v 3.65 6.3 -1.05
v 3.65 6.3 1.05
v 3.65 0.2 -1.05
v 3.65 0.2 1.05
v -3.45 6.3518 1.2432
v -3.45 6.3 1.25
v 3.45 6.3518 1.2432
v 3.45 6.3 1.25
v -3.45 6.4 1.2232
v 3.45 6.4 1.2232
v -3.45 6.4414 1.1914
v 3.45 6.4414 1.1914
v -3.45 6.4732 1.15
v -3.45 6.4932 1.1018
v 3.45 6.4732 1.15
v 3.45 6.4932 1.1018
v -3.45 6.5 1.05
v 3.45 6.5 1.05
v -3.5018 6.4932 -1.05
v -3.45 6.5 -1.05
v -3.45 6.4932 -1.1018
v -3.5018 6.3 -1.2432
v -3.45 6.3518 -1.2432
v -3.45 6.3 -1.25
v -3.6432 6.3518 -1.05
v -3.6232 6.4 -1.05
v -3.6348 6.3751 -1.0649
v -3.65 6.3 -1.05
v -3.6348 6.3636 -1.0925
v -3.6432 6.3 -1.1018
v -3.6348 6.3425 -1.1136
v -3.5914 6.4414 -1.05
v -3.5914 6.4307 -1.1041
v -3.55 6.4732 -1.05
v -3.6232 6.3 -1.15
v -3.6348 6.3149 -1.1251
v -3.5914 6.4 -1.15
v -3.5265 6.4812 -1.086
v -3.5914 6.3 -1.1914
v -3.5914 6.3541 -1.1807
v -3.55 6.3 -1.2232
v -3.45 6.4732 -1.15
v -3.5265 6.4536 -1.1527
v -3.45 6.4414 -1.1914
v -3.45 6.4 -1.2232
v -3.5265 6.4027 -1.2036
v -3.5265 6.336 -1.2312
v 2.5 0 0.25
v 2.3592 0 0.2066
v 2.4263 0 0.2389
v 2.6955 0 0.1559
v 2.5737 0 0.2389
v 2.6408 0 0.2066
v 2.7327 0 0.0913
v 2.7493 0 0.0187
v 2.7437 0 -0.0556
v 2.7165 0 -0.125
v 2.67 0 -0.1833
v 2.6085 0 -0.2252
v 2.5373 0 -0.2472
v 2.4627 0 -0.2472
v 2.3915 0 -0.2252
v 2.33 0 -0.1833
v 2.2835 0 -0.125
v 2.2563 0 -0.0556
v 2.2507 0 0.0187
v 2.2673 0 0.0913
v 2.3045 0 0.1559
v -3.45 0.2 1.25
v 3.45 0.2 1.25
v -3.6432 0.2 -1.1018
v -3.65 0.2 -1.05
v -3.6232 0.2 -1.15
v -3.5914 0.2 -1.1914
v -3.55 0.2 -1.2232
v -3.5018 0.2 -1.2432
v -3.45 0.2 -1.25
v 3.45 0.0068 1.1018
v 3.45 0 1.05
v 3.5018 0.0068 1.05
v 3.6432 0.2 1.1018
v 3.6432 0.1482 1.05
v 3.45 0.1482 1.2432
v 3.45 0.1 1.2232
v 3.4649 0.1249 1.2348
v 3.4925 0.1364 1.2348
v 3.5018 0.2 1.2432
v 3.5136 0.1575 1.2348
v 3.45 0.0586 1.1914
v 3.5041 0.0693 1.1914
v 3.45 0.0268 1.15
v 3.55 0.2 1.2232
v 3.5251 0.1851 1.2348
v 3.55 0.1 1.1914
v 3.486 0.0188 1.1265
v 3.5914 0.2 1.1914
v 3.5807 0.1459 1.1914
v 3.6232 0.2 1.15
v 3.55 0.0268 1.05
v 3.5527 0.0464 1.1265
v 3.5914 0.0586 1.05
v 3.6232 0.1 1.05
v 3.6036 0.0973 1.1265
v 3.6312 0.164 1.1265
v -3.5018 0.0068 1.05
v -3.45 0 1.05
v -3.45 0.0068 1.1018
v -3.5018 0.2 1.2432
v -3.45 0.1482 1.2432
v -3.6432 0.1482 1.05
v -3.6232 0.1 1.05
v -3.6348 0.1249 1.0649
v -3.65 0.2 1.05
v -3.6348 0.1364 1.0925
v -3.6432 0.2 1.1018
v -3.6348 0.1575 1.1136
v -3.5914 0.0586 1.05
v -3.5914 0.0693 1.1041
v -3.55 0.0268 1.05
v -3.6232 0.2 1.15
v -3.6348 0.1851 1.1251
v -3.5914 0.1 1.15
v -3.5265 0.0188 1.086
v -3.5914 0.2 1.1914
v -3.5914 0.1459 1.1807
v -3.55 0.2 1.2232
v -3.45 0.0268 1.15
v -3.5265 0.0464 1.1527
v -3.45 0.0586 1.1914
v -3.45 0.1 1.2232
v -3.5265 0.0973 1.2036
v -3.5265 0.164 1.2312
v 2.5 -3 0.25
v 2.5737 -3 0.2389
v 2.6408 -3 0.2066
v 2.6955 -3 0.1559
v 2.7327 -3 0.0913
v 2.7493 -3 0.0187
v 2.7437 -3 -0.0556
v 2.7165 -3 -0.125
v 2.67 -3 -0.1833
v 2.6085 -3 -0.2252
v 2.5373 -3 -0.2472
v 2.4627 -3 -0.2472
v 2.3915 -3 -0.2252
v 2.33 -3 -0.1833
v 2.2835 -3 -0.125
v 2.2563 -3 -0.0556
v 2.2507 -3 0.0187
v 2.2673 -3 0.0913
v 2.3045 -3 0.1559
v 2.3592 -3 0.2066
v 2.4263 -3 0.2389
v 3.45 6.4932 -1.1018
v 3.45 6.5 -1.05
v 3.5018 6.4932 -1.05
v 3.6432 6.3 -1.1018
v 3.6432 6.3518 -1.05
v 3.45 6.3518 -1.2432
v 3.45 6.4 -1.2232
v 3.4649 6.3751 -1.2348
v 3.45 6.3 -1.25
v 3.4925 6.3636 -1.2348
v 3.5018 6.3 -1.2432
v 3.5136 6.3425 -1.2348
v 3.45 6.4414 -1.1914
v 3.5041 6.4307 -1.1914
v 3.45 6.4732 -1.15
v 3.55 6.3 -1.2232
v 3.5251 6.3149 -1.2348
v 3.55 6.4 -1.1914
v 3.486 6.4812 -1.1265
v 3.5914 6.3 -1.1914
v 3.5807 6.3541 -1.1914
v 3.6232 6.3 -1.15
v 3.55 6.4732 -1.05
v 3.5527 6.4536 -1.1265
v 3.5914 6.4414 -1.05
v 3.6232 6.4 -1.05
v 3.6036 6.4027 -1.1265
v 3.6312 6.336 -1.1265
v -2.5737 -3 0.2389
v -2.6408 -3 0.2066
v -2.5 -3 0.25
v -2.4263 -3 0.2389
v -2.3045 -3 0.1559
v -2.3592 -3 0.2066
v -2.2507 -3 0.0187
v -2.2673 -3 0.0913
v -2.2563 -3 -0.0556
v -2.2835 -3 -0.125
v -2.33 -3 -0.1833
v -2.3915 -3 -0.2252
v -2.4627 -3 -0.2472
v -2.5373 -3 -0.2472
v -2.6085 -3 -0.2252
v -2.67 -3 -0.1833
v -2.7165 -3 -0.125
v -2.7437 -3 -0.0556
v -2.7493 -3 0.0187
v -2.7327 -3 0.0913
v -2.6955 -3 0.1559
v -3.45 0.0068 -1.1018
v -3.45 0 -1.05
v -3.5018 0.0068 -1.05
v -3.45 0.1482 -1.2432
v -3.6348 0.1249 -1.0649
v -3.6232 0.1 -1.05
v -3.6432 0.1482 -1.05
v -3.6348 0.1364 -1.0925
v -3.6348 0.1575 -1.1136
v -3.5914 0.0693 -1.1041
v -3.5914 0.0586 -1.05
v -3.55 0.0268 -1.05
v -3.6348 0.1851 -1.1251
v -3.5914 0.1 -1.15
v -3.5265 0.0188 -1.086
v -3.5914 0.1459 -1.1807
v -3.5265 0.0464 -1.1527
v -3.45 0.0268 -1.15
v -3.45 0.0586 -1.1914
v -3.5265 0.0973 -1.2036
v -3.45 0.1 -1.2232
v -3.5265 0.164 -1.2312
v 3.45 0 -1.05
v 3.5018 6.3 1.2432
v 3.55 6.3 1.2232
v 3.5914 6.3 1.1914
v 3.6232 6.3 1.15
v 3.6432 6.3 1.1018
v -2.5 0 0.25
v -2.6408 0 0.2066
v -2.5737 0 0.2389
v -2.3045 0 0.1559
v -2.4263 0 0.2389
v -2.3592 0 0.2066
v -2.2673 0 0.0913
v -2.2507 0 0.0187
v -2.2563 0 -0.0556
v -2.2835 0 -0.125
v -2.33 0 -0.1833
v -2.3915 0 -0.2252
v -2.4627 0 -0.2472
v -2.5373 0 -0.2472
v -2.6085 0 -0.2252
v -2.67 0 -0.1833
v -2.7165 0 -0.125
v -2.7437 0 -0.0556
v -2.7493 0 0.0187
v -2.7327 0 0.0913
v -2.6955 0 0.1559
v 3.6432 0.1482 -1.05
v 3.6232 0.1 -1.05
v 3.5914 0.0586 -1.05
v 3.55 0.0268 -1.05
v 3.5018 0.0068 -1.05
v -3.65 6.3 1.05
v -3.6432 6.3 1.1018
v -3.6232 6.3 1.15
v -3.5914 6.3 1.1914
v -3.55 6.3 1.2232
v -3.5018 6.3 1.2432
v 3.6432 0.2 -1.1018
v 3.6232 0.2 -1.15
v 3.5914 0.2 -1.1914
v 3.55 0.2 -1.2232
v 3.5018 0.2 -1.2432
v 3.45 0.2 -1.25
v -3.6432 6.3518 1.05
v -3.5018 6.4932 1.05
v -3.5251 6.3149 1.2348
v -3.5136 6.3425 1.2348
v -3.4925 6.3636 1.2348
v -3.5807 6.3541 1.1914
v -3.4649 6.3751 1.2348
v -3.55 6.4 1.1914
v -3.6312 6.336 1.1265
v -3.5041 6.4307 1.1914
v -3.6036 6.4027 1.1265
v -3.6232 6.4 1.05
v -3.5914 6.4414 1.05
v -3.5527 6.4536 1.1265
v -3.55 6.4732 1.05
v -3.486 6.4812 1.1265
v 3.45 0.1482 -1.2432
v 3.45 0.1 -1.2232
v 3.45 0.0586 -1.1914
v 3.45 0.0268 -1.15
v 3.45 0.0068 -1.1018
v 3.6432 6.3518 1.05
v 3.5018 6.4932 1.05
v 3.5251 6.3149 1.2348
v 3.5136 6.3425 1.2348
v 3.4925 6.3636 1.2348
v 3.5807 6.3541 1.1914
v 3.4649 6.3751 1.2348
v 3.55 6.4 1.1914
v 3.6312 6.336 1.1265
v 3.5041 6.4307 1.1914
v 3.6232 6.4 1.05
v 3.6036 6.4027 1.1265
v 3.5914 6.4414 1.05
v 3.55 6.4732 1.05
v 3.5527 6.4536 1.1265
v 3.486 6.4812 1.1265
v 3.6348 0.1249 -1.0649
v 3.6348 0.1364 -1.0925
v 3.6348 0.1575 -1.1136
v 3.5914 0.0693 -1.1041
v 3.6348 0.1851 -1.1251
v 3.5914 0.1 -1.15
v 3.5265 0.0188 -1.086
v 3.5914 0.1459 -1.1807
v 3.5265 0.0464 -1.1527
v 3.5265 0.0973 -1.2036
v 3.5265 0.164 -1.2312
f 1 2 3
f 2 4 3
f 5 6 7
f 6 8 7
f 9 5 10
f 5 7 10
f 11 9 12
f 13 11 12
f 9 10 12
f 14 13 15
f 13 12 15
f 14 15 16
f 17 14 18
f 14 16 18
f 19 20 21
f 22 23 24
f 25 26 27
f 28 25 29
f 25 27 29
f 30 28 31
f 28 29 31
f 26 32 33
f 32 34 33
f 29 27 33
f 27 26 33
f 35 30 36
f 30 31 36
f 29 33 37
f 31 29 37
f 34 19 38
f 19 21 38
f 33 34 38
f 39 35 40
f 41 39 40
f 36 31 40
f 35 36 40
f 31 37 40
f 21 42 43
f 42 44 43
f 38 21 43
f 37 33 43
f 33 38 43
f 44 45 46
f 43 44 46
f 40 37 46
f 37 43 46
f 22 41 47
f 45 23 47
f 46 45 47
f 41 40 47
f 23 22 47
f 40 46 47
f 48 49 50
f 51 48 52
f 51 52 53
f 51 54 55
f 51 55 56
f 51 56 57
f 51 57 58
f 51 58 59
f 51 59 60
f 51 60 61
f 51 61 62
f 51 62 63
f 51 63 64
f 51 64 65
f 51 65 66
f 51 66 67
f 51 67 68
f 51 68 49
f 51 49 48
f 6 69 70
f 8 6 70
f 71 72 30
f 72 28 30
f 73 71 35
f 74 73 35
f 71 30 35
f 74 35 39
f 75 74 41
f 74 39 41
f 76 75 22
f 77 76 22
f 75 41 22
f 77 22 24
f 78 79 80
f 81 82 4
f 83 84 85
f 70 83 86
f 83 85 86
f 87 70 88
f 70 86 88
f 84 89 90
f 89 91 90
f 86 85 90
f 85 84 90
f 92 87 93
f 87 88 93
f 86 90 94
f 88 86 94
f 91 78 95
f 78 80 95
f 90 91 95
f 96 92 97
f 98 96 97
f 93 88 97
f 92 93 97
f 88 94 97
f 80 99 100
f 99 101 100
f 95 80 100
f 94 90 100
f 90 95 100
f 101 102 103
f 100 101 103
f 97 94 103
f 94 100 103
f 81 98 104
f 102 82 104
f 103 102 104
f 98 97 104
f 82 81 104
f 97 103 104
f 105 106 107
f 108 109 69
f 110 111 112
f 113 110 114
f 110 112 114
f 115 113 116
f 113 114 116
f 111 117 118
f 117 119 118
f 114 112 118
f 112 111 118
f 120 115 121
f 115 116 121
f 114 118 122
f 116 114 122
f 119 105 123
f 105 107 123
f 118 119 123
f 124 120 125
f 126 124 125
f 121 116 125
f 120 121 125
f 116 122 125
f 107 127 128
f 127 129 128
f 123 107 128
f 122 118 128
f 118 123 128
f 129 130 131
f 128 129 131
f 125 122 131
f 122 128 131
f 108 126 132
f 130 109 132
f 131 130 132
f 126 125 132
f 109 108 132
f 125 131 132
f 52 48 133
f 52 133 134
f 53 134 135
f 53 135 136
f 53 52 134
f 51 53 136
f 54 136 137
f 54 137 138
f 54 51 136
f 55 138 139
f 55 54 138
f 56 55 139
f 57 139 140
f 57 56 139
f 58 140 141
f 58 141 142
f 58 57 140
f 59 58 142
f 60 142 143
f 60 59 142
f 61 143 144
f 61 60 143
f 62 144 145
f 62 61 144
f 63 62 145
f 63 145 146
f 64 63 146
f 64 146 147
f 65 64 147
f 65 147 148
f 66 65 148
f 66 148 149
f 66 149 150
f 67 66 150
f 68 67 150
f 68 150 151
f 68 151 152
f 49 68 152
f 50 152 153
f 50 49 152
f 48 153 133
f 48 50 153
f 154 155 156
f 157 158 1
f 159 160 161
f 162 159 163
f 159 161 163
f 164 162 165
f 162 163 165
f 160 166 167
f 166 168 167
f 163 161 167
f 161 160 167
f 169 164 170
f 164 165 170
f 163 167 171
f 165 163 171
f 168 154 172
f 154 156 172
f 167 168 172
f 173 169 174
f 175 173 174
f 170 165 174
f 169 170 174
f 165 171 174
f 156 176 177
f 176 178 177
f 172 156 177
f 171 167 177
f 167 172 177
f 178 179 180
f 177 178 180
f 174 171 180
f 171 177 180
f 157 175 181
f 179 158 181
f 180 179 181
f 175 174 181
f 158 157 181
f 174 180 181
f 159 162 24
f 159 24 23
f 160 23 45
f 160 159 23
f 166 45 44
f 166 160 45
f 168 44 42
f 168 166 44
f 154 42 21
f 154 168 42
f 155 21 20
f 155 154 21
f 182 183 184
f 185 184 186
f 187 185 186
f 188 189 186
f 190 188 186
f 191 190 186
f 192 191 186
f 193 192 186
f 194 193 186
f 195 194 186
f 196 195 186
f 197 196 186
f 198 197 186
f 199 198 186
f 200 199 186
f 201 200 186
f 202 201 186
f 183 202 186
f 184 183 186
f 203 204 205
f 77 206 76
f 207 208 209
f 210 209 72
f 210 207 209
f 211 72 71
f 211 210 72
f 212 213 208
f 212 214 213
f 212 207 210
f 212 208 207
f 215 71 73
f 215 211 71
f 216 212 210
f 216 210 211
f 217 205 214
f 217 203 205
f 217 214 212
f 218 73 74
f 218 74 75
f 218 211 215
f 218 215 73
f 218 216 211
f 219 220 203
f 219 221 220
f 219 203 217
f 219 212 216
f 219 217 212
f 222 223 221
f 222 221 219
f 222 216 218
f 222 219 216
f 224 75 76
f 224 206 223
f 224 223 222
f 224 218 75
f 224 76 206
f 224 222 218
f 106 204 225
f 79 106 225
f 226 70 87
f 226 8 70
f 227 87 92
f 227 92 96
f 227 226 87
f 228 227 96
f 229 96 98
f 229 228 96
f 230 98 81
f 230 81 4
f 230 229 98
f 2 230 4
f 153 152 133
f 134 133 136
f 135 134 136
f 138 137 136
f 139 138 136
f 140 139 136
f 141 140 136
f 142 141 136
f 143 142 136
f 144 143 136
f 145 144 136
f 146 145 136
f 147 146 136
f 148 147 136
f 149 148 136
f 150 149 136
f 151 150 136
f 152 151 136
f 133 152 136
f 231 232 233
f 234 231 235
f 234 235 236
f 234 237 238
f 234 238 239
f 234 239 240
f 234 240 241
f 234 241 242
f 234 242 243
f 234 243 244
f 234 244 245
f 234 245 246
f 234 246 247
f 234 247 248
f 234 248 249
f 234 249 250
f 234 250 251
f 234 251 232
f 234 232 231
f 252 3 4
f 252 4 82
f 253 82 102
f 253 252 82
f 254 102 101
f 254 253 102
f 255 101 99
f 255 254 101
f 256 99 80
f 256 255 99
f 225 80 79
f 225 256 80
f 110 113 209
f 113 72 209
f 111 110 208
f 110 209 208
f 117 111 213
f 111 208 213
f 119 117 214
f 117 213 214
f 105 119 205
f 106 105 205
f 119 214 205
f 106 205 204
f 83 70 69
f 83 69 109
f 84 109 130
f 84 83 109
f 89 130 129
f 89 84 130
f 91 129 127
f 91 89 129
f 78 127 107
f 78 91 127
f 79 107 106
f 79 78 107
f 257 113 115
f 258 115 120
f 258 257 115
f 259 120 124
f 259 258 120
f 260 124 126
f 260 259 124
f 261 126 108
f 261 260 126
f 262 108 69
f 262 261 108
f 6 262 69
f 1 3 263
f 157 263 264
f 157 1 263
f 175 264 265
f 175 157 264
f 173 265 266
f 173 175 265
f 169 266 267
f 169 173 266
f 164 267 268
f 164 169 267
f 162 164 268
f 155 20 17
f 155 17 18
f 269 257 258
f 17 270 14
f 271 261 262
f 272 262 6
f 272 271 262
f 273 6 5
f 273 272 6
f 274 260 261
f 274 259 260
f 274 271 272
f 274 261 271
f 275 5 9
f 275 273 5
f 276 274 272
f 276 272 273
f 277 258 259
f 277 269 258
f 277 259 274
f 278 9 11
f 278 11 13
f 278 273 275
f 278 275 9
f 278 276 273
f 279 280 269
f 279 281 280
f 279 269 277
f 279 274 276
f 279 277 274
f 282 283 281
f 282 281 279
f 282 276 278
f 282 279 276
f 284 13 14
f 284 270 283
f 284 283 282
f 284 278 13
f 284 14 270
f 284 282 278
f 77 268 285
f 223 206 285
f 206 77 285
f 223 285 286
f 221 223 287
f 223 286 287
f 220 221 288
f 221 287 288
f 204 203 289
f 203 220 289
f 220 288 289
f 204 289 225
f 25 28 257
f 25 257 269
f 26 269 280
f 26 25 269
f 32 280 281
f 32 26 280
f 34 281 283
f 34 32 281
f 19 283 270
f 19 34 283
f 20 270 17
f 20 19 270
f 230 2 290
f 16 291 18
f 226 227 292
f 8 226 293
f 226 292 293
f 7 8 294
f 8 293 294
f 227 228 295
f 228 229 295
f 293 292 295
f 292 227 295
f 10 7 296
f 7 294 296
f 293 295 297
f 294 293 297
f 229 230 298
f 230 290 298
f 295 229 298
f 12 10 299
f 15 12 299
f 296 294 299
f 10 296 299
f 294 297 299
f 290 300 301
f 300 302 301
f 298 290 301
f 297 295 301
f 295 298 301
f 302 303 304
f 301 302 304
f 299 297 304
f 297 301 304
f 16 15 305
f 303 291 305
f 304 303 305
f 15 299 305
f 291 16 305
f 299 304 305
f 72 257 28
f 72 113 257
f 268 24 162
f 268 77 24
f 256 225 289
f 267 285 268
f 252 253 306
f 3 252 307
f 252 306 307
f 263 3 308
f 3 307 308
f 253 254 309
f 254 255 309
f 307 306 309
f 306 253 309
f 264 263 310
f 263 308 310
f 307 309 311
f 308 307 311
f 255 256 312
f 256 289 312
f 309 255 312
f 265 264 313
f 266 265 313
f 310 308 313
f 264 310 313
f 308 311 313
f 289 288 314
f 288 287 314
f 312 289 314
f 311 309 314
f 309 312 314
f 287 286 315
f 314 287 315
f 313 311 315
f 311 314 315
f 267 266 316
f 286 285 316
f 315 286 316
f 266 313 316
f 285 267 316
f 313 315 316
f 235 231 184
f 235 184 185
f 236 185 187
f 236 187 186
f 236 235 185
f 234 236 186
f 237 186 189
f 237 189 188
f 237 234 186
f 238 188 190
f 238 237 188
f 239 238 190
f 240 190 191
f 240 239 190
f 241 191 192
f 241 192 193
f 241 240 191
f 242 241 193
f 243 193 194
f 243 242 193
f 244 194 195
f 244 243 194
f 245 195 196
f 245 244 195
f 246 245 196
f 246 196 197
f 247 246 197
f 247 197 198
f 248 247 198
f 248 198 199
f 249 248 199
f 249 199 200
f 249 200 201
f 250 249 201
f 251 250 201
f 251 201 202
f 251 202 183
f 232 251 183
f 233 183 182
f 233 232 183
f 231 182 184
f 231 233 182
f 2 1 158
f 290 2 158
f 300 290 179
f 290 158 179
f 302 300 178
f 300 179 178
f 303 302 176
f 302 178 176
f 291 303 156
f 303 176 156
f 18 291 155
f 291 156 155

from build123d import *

# Parameters (mm, degrees)
SKETCH1_W             = 7.3
SKETCH1_H             = 2.5
BOSS_EXTRUDE1_DEPTH   = 6.5
SKETCH2_R             = 0.25
BOSS_EXTRUDE2_DEPTH   = 3
BOSS_EXTRUDE2_2_DEPTH = 3
FILLET1_R             = 0.2


with BuildPart() as part:
    # Sketch1 → Boss-Extrude1 (new body)
    with BuildSketch(Plane(origin=(0, 0, 0), x_dir=(1, 0, 0), z_dir=(0, 1, 0))):
        Rectangle(SKETCH1_W, SKETCH1_H)
    extrude(amount=BOSS_EXTRUDE1_DEPTH)

    # Fillet1
    fillet1_edges = [part.edges().sort_by_distance(p)[0] for p in [
        (3.65, 6.5, 0),
        (0, 6.5, -1.25),
        (-3.65, 6.5, 0),
        (0, 0, -1.25),
        (3.65, 0, 0),
        (0, 0, 1.25),
        (-3.65, 0, 0),
        (-3.65, 3.25, -1.25),
        (3.65, 3.25, -1.25),
        (3.65, 3.25, 1.25),
        (-3.65, 3.25, 1.25),
        (0, 6.5, 1.25),
    ]]
    fillet(fillet1_edges, radius=FILLET1_R)


with BuildPart() as body_2:
    # Sketch2 → Boss-Extrude2 (new body)
    with BuildSketch(Plane(origin=(0, 0, 0), x_dir=(1, 0, 0), z_dir=(0, 1, 0))):
        with Locations(Location((-2.5, 0, 0), (0, 0, 270))):
            Circle(SKETCH2_R)
    extrude(amount=-BOSS_EXTRUDE2_DEPTH)


with BuildPart() as body_3:
    # Sketch2 → Boss-Extrude2 2 (new body)
    with BuildSketch(Plane(origin=(0, 0, 0), x_dir=(1, 0, 0), z_dir=(0, 1, 0))):
        with Locations(Location((2.5, 0, 0), (0, 0, 270))):
            Circle(SKETCH2_R)
    extrude(amount=-BOSS_EXTRUDE2_2_DEPTH)


solid = Compound([part.part, body_2.part, body_3.part])
